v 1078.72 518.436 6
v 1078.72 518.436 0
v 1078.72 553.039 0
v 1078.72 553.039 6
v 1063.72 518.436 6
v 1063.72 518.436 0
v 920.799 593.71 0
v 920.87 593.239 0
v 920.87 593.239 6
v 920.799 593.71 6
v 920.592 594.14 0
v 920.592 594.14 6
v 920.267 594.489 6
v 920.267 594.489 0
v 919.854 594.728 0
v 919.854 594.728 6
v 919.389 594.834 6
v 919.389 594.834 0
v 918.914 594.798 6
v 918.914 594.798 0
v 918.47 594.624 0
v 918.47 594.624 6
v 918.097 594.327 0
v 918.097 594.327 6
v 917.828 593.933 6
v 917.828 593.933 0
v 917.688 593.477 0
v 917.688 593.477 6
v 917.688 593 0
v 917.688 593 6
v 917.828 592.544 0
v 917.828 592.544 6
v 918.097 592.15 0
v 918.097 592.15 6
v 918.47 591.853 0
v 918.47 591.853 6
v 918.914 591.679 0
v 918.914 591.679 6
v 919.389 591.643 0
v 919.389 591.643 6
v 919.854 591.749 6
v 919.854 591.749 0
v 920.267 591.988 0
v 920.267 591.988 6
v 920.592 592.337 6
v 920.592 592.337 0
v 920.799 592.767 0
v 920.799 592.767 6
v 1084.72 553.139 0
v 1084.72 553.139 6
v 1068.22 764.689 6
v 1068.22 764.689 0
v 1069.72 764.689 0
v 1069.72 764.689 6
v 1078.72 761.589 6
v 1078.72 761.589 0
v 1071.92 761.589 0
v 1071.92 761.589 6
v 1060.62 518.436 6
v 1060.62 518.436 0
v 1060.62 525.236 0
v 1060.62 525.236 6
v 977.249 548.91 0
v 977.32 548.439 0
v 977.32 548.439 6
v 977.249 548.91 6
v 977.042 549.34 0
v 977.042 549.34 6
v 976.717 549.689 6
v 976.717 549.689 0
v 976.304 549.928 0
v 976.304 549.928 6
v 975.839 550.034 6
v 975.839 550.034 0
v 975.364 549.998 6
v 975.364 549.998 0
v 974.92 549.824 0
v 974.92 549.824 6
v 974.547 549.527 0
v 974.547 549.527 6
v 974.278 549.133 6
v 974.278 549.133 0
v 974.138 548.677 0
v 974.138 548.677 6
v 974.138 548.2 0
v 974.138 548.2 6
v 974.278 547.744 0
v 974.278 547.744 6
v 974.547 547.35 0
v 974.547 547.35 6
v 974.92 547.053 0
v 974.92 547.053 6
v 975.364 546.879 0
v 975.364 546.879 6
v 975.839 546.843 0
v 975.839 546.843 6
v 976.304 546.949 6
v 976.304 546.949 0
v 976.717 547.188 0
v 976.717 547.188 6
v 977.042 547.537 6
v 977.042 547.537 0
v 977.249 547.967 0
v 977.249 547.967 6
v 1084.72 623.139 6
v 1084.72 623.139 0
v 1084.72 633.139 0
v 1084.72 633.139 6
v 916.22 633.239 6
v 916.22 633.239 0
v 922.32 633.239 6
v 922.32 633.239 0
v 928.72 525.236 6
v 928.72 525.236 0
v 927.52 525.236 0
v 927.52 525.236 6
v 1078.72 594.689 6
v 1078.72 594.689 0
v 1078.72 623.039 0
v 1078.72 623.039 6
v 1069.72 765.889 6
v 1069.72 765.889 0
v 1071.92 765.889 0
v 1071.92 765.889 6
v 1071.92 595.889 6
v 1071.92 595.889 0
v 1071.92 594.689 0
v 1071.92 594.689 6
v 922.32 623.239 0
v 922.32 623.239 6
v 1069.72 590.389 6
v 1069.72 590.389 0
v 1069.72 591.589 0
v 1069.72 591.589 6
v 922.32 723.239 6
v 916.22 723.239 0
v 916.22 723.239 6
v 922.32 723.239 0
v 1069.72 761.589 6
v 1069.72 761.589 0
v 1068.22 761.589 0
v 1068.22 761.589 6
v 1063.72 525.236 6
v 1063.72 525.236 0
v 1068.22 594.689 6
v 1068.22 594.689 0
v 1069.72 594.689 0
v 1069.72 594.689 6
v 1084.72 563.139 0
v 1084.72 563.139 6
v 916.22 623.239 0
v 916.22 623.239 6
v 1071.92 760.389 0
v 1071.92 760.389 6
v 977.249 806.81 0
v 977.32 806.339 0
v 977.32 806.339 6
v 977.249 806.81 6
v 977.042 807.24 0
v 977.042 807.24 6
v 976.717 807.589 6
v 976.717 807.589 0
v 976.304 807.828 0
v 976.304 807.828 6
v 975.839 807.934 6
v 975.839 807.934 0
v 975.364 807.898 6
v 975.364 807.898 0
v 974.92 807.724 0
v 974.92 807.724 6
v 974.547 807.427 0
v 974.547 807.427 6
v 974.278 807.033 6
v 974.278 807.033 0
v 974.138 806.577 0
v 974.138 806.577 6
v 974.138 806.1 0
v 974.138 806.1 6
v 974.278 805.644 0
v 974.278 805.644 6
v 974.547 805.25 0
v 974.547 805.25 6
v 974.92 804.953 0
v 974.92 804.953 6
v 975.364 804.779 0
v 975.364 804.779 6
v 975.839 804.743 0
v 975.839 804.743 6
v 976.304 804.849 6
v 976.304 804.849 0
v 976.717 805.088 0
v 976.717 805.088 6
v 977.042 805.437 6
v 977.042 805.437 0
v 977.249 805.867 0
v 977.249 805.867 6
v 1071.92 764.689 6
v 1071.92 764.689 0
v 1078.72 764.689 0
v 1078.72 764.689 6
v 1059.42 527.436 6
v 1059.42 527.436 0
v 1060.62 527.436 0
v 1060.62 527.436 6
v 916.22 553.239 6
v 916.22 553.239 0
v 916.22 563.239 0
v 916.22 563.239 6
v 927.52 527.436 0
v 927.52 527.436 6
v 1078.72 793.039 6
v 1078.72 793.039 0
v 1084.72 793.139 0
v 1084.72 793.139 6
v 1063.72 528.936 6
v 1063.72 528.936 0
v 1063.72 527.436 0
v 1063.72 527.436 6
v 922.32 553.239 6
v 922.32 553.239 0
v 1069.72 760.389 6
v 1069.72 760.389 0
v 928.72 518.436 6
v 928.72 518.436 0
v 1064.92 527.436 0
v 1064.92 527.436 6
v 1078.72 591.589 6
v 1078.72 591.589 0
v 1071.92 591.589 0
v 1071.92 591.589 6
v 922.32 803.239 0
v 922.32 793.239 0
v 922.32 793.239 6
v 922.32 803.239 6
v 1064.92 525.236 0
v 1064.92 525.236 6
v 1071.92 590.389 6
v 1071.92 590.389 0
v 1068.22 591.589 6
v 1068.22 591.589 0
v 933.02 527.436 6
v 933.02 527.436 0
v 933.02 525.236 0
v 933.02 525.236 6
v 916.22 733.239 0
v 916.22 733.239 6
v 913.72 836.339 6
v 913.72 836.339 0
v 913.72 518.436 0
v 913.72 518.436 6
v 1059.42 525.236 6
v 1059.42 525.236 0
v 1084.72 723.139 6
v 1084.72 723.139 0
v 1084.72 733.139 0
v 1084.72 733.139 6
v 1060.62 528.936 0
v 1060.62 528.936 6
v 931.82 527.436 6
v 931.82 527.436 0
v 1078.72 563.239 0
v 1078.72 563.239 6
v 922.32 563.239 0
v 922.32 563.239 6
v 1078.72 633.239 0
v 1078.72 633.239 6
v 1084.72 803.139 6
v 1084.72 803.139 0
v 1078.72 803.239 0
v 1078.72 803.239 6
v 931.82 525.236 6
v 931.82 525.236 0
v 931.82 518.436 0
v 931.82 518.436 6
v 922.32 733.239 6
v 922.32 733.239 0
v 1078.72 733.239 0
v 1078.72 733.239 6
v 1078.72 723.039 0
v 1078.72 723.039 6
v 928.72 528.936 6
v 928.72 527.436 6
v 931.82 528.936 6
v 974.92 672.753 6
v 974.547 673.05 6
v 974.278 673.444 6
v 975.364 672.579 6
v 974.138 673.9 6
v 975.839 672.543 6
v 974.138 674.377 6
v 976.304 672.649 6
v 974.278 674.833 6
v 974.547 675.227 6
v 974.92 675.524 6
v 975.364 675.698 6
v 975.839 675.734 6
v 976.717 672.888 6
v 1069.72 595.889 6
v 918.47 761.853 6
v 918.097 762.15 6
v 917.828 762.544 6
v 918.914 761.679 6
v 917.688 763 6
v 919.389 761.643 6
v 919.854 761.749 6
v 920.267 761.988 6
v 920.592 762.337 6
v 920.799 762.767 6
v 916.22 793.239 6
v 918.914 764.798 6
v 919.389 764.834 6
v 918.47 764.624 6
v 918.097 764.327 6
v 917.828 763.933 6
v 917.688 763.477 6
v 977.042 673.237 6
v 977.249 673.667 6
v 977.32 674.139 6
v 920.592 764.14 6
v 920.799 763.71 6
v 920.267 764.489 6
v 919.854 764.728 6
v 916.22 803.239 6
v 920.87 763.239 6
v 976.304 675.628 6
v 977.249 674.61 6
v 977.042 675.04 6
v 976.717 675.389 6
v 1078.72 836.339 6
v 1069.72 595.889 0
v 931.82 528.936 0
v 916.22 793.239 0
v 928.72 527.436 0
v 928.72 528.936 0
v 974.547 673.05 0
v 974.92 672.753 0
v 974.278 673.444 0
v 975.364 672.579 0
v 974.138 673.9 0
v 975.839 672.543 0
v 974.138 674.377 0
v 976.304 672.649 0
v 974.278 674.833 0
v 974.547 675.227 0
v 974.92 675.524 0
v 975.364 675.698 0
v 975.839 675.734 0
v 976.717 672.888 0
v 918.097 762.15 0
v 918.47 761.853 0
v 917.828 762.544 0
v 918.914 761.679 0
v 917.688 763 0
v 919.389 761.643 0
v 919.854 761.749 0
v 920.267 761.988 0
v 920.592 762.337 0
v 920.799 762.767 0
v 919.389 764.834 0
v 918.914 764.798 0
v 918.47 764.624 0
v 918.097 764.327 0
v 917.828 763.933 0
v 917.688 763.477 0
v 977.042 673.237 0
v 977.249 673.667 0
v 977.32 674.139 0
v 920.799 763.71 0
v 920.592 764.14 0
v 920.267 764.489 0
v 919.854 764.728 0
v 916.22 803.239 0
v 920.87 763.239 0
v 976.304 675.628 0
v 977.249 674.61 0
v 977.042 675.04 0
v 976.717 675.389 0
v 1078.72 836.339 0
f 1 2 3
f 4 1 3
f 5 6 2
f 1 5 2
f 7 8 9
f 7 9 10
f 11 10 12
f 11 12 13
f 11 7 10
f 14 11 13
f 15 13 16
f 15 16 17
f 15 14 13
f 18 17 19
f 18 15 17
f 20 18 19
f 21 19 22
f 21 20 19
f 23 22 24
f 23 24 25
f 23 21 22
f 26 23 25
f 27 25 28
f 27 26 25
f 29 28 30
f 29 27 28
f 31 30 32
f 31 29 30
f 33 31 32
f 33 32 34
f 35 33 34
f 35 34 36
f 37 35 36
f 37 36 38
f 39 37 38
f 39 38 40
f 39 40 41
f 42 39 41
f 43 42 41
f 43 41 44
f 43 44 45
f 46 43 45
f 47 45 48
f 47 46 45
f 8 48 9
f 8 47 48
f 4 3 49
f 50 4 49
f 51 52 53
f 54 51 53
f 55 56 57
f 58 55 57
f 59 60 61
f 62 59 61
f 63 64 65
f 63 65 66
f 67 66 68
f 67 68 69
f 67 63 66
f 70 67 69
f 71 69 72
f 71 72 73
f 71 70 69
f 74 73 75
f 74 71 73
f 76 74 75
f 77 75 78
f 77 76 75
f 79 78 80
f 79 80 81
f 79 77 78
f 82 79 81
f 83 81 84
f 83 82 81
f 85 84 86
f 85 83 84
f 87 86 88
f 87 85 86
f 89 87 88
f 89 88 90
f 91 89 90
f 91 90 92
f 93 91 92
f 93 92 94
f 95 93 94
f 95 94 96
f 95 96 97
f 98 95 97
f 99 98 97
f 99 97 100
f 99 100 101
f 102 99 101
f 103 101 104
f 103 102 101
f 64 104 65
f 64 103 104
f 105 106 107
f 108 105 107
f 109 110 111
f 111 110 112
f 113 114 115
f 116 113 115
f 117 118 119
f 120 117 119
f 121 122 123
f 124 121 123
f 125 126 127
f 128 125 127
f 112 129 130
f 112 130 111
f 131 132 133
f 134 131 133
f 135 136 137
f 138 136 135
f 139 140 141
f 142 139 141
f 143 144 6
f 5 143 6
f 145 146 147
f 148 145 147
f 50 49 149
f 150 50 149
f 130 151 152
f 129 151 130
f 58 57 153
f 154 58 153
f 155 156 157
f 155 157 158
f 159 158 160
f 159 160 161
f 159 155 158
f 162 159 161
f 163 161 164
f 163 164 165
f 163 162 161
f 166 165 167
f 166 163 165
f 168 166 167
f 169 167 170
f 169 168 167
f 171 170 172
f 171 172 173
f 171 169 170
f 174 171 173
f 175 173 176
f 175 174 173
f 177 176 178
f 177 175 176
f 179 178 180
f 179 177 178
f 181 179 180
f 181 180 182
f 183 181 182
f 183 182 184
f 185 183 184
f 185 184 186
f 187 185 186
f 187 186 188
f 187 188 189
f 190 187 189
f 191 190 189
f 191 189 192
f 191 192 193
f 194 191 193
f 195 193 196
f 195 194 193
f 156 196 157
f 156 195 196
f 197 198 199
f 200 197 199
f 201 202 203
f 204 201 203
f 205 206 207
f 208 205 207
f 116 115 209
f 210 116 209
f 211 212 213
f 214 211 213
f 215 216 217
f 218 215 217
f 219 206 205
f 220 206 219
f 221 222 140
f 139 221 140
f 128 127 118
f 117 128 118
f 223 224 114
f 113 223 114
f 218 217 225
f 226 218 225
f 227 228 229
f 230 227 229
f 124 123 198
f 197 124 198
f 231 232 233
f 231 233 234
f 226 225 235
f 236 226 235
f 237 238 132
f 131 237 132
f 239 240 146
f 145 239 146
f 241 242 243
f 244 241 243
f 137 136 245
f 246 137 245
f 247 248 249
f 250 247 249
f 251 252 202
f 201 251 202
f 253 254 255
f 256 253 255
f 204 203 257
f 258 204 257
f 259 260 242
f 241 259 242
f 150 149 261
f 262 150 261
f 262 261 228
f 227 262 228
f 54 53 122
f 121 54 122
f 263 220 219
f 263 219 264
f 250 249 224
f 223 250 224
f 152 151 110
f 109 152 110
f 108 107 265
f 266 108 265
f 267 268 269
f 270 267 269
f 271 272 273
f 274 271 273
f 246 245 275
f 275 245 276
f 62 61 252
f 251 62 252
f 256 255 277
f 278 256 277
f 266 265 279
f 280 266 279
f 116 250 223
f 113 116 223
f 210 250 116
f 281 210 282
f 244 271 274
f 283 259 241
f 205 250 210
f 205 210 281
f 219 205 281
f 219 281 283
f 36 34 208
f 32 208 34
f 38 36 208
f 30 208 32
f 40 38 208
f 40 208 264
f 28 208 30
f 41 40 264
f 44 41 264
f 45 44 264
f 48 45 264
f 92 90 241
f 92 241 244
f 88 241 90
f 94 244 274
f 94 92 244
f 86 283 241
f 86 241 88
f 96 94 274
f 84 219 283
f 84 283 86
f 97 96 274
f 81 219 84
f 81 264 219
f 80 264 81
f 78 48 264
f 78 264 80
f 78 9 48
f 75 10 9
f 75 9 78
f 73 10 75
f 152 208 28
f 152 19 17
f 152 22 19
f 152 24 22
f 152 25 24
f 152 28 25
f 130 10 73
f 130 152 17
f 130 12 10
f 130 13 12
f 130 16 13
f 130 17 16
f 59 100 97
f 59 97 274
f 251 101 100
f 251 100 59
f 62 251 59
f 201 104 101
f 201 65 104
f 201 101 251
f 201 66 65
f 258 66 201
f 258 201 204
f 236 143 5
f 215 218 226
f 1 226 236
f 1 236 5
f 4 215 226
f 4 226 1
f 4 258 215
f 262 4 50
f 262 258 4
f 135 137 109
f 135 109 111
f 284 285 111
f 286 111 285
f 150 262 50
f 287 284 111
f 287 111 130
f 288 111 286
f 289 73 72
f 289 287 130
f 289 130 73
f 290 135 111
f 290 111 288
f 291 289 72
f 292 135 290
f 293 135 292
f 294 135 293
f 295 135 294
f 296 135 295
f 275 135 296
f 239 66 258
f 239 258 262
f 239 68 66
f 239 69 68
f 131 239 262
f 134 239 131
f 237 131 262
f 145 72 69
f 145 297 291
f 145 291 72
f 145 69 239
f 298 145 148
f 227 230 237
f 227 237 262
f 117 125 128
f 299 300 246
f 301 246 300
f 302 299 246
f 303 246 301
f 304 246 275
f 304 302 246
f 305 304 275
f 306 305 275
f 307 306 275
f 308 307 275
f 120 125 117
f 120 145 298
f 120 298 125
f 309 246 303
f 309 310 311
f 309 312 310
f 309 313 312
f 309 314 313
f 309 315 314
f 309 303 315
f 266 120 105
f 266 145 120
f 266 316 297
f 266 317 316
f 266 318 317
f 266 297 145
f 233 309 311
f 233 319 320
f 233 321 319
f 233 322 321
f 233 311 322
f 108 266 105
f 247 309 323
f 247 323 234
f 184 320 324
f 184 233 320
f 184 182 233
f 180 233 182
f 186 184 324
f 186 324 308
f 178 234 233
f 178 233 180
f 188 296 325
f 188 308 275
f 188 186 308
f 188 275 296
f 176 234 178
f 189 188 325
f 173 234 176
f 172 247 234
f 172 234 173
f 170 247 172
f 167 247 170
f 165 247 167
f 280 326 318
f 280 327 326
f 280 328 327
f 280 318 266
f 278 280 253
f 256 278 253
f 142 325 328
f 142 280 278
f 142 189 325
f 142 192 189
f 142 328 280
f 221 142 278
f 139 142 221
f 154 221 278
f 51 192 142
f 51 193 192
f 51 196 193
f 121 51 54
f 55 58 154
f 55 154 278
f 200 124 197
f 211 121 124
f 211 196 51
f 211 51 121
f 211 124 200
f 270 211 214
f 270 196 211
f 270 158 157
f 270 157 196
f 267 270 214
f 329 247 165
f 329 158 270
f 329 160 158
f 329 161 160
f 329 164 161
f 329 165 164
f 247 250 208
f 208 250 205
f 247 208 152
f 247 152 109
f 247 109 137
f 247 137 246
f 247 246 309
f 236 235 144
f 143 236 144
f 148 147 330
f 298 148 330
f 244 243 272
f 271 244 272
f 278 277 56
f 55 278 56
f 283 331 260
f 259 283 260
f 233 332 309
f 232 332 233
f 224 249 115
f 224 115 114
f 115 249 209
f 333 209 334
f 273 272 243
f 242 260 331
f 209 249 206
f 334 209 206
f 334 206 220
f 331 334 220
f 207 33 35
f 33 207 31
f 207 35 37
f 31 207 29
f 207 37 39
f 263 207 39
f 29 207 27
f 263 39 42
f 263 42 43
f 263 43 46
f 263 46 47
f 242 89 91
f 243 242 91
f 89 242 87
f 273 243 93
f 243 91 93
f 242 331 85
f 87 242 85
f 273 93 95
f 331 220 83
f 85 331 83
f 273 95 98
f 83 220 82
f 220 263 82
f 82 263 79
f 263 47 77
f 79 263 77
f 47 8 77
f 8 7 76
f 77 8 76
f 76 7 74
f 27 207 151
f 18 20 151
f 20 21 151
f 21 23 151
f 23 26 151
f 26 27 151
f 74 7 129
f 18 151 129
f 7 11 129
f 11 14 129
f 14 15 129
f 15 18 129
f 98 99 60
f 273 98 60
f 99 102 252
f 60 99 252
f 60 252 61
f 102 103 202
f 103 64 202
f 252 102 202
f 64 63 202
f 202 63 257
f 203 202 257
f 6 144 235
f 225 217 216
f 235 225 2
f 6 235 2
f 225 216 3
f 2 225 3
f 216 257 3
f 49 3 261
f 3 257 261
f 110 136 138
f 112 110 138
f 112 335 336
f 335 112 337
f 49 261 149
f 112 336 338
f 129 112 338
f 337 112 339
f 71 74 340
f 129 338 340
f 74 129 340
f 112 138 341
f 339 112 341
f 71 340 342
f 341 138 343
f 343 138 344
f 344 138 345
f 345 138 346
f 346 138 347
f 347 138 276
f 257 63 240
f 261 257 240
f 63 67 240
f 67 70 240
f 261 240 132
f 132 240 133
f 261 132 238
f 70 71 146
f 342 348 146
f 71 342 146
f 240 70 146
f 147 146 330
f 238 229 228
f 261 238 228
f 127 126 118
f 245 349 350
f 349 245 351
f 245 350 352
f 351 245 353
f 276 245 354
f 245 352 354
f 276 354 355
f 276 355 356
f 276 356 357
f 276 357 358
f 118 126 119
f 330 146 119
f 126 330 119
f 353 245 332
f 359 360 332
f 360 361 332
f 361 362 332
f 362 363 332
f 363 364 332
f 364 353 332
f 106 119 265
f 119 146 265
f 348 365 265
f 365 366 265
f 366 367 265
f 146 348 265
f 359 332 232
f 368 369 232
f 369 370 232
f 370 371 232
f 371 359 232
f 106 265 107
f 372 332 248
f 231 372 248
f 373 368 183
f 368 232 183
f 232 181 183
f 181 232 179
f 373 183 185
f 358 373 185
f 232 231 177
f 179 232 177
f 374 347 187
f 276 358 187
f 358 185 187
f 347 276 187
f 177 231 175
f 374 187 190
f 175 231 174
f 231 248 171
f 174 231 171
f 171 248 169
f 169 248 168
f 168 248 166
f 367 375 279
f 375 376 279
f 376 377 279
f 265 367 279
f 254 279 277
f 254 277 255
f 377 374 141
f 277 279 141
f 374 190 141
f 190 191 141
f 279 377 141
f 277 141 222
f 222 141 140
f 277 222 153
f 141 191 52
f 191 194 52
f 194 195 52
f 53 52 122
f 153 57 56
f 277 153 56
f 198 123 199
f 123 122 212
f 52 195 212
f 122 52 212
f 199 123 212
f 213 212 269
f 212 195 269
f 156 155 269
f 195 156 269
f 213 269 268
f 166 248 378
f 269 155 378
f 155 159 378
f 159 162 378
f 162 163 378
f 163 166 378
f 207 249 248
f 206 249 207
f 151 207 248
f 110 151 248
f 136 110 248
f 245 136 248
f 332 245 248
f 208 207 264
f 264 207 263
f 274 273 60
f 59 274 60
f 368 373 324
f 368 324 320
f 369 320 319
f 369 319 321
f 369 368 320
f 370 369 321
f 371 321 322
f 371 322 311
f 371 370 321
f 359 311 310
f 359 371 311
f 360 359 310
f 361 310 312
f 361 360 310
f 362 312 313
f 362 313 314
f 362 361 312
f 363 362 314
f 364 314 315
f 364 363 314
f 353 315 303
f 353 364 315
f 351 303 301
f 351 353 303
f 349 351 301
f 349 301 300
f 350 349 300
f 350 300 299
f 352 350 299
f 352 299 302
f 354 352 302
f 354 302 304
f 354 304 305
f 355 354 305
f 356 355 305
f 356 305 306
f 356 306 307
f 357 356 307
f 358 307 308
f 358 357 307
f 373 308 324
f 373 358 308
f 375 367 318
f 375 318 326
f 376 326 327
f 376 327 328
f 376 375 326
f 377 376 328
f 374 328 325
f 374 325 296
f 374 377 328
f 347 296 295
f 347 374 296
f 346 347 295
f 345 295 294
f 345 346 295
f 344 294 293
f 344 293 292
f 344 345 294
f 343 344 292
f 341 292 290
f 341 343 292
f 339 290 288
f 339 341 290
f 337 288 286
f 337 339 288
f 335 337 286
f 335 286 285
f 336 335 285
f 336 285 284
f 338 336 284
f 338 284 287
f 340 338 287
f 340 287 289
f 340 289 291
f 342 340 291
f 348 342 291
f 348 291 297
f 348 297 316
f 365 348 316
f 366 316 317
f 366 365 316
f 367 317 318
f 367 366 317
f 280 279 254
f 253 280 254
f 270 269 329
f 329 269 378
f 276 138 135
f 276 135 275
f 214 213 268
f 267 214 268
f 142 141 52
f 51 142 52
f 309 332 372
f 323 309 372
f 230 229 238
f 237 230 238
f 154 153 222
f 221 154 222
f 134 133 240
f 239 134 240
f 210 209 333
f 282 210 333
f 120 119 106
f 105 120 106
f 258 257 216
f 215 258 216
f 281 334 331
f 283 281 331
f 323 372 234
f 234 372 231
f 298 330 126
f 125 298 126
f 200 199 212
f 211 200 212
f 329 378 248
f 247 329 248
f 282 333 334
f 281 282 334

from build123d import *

# Parameters (mm, degrees)
SKETCH_1_R      = 1.6
SKETCH_1_W      = 6.1
SKETCH_1_H      = 10
EXTRUDE_1_DEPTH = 6


with BuildPart() as part:
    # Эскиз1 → Бобышка-Вытянуть1 (new body)
    with BuildSketch(Plane.XY):
        Polygon((1078.719864828, 623.038519), (1084.719864828, 623.138519), (1084.719864828, 633.138519), (1078.719864828, 633.238519), (1078.719864828, 723.038519), (1084.719864828, 723.138519), (1084.719864828, 733.138519), (1078.719864828, 733.238519), (1078.719864828, 761.588519), (1071.919864828, 761.588519), (1071.919864828, 760.388519), (1069.719864828, 760.388519), (1069.719864828, 761.588519), (1068.219864828, 761.588519), (1068.219864828, 764.688519), (1069.719864828, 764.688519), (1069.719864828, 765.888519), (1071.919864828, 765.888519), (1071.919864828, 764.688519), (1078.719864828, 764.688519), (1078.719864828, 793.038519), (1084.719864828, 793.138519), (1084.719864828, 803.138519), (1078.719864828, 803.238519), (1078.719864828, 836.338519), (978.719864828, 836.338519), (913.719864828, 836.338519), (913.719864828, 518.436195), (928.719864828, 518.436195), (928.719864828, 525.236195), (927.519864828, 525.236195), (927.519864828, 527.436195), (928.719864828, 527.436195), (928.719864828, 528.936195), (931.819864828, 528.936195), (931.819864828, 527.436195), (933.019864828, 527.436195), (933.019864828, 525.236195), (931.819864828, 525.236195), (931.819864828, 518.436195), (978.719864828, 518.436195), (1060.619864828, 518.436195), (1060.619864828, 525.236195), (1059.419864828, 525.236195), (1059.419864828, 527.436195), (1060.619864828, 527.436195), (1060.619864828, 528.936195), (1063.719864828, 528.936195), (1063.719864828, 527.436195), (1064.919864828, 527.436195), (1064.919864828, 525.236195), (1063.719864828, 525.236195), (1063.719864828, 518.436195), (1078.719864828, 518.436195), (1078.719864828, 553.038519), (1084.719864828, 553.138519), (1084.719864828, 563.138519), (1078.719864828, 563.238519), (1078.719864828, 591.588519), (1071.919864828, 591.588519), (1071.919864828, 590.388519), (1069.719864828, 590.388519), (1069.719864828, 591.588519), (1068.219864828, 591.588519), (1068.219864828, 594.688519), (1069.719864828, 594.688519), (1069.719864828, 595.888519), (1071.919864828, 595.888519), (1071.919864828, 594.688519), (1078.719864828, 594.688519), align=None)
        with Locations((919.269864828, 593.238519)):
            Circle(SKETCH_1_R, mode=Mode.SUBTRACT)
        with Locations((919.269864828, 763.238519)):
            Circle(SKETCH_1_R, mode=Mode.SUBTRACT)
        with Locations((975.719864828, 806.338519)):
            Circle(SKETCH_1_R, mode=Mode.SUBTRACT)
        with Locations((975.719864828, 674.138519)):
            Circle(SKETCH_1_R, mode=Mode.SUBTRACT)
        with Locations((975.719864828, 548.438519)):
            Circle(SKETCH_1_R, mode=Mode.SUBTRACT)
        with Locations((919.269864828, 558.238519)):
            Rectangle(SKETCH_1_W, SKETCH_1_H, mode=Mode.SUBTRACT)
        with Locations((919.269864828, 628.238519)):
            Rectangle(SKETCH_1_W, SKETCH_1_H, mode=Mode.SUBTRACT)
        with Locations((919.269864828, 728.238519)):
            Rectangle(SKETCH_1_W, SKETCH_1_H, mode=Mode.SUBTRACT)
        with Locations((919.269864828, 798.238519)):
            Rectangle(SKETCH_1_W, SKETCH_1_H, mode=Mode.SUBTRACT)
    extrude(amount=EXTRUDE_1_DEPTH)


solid = part.part
